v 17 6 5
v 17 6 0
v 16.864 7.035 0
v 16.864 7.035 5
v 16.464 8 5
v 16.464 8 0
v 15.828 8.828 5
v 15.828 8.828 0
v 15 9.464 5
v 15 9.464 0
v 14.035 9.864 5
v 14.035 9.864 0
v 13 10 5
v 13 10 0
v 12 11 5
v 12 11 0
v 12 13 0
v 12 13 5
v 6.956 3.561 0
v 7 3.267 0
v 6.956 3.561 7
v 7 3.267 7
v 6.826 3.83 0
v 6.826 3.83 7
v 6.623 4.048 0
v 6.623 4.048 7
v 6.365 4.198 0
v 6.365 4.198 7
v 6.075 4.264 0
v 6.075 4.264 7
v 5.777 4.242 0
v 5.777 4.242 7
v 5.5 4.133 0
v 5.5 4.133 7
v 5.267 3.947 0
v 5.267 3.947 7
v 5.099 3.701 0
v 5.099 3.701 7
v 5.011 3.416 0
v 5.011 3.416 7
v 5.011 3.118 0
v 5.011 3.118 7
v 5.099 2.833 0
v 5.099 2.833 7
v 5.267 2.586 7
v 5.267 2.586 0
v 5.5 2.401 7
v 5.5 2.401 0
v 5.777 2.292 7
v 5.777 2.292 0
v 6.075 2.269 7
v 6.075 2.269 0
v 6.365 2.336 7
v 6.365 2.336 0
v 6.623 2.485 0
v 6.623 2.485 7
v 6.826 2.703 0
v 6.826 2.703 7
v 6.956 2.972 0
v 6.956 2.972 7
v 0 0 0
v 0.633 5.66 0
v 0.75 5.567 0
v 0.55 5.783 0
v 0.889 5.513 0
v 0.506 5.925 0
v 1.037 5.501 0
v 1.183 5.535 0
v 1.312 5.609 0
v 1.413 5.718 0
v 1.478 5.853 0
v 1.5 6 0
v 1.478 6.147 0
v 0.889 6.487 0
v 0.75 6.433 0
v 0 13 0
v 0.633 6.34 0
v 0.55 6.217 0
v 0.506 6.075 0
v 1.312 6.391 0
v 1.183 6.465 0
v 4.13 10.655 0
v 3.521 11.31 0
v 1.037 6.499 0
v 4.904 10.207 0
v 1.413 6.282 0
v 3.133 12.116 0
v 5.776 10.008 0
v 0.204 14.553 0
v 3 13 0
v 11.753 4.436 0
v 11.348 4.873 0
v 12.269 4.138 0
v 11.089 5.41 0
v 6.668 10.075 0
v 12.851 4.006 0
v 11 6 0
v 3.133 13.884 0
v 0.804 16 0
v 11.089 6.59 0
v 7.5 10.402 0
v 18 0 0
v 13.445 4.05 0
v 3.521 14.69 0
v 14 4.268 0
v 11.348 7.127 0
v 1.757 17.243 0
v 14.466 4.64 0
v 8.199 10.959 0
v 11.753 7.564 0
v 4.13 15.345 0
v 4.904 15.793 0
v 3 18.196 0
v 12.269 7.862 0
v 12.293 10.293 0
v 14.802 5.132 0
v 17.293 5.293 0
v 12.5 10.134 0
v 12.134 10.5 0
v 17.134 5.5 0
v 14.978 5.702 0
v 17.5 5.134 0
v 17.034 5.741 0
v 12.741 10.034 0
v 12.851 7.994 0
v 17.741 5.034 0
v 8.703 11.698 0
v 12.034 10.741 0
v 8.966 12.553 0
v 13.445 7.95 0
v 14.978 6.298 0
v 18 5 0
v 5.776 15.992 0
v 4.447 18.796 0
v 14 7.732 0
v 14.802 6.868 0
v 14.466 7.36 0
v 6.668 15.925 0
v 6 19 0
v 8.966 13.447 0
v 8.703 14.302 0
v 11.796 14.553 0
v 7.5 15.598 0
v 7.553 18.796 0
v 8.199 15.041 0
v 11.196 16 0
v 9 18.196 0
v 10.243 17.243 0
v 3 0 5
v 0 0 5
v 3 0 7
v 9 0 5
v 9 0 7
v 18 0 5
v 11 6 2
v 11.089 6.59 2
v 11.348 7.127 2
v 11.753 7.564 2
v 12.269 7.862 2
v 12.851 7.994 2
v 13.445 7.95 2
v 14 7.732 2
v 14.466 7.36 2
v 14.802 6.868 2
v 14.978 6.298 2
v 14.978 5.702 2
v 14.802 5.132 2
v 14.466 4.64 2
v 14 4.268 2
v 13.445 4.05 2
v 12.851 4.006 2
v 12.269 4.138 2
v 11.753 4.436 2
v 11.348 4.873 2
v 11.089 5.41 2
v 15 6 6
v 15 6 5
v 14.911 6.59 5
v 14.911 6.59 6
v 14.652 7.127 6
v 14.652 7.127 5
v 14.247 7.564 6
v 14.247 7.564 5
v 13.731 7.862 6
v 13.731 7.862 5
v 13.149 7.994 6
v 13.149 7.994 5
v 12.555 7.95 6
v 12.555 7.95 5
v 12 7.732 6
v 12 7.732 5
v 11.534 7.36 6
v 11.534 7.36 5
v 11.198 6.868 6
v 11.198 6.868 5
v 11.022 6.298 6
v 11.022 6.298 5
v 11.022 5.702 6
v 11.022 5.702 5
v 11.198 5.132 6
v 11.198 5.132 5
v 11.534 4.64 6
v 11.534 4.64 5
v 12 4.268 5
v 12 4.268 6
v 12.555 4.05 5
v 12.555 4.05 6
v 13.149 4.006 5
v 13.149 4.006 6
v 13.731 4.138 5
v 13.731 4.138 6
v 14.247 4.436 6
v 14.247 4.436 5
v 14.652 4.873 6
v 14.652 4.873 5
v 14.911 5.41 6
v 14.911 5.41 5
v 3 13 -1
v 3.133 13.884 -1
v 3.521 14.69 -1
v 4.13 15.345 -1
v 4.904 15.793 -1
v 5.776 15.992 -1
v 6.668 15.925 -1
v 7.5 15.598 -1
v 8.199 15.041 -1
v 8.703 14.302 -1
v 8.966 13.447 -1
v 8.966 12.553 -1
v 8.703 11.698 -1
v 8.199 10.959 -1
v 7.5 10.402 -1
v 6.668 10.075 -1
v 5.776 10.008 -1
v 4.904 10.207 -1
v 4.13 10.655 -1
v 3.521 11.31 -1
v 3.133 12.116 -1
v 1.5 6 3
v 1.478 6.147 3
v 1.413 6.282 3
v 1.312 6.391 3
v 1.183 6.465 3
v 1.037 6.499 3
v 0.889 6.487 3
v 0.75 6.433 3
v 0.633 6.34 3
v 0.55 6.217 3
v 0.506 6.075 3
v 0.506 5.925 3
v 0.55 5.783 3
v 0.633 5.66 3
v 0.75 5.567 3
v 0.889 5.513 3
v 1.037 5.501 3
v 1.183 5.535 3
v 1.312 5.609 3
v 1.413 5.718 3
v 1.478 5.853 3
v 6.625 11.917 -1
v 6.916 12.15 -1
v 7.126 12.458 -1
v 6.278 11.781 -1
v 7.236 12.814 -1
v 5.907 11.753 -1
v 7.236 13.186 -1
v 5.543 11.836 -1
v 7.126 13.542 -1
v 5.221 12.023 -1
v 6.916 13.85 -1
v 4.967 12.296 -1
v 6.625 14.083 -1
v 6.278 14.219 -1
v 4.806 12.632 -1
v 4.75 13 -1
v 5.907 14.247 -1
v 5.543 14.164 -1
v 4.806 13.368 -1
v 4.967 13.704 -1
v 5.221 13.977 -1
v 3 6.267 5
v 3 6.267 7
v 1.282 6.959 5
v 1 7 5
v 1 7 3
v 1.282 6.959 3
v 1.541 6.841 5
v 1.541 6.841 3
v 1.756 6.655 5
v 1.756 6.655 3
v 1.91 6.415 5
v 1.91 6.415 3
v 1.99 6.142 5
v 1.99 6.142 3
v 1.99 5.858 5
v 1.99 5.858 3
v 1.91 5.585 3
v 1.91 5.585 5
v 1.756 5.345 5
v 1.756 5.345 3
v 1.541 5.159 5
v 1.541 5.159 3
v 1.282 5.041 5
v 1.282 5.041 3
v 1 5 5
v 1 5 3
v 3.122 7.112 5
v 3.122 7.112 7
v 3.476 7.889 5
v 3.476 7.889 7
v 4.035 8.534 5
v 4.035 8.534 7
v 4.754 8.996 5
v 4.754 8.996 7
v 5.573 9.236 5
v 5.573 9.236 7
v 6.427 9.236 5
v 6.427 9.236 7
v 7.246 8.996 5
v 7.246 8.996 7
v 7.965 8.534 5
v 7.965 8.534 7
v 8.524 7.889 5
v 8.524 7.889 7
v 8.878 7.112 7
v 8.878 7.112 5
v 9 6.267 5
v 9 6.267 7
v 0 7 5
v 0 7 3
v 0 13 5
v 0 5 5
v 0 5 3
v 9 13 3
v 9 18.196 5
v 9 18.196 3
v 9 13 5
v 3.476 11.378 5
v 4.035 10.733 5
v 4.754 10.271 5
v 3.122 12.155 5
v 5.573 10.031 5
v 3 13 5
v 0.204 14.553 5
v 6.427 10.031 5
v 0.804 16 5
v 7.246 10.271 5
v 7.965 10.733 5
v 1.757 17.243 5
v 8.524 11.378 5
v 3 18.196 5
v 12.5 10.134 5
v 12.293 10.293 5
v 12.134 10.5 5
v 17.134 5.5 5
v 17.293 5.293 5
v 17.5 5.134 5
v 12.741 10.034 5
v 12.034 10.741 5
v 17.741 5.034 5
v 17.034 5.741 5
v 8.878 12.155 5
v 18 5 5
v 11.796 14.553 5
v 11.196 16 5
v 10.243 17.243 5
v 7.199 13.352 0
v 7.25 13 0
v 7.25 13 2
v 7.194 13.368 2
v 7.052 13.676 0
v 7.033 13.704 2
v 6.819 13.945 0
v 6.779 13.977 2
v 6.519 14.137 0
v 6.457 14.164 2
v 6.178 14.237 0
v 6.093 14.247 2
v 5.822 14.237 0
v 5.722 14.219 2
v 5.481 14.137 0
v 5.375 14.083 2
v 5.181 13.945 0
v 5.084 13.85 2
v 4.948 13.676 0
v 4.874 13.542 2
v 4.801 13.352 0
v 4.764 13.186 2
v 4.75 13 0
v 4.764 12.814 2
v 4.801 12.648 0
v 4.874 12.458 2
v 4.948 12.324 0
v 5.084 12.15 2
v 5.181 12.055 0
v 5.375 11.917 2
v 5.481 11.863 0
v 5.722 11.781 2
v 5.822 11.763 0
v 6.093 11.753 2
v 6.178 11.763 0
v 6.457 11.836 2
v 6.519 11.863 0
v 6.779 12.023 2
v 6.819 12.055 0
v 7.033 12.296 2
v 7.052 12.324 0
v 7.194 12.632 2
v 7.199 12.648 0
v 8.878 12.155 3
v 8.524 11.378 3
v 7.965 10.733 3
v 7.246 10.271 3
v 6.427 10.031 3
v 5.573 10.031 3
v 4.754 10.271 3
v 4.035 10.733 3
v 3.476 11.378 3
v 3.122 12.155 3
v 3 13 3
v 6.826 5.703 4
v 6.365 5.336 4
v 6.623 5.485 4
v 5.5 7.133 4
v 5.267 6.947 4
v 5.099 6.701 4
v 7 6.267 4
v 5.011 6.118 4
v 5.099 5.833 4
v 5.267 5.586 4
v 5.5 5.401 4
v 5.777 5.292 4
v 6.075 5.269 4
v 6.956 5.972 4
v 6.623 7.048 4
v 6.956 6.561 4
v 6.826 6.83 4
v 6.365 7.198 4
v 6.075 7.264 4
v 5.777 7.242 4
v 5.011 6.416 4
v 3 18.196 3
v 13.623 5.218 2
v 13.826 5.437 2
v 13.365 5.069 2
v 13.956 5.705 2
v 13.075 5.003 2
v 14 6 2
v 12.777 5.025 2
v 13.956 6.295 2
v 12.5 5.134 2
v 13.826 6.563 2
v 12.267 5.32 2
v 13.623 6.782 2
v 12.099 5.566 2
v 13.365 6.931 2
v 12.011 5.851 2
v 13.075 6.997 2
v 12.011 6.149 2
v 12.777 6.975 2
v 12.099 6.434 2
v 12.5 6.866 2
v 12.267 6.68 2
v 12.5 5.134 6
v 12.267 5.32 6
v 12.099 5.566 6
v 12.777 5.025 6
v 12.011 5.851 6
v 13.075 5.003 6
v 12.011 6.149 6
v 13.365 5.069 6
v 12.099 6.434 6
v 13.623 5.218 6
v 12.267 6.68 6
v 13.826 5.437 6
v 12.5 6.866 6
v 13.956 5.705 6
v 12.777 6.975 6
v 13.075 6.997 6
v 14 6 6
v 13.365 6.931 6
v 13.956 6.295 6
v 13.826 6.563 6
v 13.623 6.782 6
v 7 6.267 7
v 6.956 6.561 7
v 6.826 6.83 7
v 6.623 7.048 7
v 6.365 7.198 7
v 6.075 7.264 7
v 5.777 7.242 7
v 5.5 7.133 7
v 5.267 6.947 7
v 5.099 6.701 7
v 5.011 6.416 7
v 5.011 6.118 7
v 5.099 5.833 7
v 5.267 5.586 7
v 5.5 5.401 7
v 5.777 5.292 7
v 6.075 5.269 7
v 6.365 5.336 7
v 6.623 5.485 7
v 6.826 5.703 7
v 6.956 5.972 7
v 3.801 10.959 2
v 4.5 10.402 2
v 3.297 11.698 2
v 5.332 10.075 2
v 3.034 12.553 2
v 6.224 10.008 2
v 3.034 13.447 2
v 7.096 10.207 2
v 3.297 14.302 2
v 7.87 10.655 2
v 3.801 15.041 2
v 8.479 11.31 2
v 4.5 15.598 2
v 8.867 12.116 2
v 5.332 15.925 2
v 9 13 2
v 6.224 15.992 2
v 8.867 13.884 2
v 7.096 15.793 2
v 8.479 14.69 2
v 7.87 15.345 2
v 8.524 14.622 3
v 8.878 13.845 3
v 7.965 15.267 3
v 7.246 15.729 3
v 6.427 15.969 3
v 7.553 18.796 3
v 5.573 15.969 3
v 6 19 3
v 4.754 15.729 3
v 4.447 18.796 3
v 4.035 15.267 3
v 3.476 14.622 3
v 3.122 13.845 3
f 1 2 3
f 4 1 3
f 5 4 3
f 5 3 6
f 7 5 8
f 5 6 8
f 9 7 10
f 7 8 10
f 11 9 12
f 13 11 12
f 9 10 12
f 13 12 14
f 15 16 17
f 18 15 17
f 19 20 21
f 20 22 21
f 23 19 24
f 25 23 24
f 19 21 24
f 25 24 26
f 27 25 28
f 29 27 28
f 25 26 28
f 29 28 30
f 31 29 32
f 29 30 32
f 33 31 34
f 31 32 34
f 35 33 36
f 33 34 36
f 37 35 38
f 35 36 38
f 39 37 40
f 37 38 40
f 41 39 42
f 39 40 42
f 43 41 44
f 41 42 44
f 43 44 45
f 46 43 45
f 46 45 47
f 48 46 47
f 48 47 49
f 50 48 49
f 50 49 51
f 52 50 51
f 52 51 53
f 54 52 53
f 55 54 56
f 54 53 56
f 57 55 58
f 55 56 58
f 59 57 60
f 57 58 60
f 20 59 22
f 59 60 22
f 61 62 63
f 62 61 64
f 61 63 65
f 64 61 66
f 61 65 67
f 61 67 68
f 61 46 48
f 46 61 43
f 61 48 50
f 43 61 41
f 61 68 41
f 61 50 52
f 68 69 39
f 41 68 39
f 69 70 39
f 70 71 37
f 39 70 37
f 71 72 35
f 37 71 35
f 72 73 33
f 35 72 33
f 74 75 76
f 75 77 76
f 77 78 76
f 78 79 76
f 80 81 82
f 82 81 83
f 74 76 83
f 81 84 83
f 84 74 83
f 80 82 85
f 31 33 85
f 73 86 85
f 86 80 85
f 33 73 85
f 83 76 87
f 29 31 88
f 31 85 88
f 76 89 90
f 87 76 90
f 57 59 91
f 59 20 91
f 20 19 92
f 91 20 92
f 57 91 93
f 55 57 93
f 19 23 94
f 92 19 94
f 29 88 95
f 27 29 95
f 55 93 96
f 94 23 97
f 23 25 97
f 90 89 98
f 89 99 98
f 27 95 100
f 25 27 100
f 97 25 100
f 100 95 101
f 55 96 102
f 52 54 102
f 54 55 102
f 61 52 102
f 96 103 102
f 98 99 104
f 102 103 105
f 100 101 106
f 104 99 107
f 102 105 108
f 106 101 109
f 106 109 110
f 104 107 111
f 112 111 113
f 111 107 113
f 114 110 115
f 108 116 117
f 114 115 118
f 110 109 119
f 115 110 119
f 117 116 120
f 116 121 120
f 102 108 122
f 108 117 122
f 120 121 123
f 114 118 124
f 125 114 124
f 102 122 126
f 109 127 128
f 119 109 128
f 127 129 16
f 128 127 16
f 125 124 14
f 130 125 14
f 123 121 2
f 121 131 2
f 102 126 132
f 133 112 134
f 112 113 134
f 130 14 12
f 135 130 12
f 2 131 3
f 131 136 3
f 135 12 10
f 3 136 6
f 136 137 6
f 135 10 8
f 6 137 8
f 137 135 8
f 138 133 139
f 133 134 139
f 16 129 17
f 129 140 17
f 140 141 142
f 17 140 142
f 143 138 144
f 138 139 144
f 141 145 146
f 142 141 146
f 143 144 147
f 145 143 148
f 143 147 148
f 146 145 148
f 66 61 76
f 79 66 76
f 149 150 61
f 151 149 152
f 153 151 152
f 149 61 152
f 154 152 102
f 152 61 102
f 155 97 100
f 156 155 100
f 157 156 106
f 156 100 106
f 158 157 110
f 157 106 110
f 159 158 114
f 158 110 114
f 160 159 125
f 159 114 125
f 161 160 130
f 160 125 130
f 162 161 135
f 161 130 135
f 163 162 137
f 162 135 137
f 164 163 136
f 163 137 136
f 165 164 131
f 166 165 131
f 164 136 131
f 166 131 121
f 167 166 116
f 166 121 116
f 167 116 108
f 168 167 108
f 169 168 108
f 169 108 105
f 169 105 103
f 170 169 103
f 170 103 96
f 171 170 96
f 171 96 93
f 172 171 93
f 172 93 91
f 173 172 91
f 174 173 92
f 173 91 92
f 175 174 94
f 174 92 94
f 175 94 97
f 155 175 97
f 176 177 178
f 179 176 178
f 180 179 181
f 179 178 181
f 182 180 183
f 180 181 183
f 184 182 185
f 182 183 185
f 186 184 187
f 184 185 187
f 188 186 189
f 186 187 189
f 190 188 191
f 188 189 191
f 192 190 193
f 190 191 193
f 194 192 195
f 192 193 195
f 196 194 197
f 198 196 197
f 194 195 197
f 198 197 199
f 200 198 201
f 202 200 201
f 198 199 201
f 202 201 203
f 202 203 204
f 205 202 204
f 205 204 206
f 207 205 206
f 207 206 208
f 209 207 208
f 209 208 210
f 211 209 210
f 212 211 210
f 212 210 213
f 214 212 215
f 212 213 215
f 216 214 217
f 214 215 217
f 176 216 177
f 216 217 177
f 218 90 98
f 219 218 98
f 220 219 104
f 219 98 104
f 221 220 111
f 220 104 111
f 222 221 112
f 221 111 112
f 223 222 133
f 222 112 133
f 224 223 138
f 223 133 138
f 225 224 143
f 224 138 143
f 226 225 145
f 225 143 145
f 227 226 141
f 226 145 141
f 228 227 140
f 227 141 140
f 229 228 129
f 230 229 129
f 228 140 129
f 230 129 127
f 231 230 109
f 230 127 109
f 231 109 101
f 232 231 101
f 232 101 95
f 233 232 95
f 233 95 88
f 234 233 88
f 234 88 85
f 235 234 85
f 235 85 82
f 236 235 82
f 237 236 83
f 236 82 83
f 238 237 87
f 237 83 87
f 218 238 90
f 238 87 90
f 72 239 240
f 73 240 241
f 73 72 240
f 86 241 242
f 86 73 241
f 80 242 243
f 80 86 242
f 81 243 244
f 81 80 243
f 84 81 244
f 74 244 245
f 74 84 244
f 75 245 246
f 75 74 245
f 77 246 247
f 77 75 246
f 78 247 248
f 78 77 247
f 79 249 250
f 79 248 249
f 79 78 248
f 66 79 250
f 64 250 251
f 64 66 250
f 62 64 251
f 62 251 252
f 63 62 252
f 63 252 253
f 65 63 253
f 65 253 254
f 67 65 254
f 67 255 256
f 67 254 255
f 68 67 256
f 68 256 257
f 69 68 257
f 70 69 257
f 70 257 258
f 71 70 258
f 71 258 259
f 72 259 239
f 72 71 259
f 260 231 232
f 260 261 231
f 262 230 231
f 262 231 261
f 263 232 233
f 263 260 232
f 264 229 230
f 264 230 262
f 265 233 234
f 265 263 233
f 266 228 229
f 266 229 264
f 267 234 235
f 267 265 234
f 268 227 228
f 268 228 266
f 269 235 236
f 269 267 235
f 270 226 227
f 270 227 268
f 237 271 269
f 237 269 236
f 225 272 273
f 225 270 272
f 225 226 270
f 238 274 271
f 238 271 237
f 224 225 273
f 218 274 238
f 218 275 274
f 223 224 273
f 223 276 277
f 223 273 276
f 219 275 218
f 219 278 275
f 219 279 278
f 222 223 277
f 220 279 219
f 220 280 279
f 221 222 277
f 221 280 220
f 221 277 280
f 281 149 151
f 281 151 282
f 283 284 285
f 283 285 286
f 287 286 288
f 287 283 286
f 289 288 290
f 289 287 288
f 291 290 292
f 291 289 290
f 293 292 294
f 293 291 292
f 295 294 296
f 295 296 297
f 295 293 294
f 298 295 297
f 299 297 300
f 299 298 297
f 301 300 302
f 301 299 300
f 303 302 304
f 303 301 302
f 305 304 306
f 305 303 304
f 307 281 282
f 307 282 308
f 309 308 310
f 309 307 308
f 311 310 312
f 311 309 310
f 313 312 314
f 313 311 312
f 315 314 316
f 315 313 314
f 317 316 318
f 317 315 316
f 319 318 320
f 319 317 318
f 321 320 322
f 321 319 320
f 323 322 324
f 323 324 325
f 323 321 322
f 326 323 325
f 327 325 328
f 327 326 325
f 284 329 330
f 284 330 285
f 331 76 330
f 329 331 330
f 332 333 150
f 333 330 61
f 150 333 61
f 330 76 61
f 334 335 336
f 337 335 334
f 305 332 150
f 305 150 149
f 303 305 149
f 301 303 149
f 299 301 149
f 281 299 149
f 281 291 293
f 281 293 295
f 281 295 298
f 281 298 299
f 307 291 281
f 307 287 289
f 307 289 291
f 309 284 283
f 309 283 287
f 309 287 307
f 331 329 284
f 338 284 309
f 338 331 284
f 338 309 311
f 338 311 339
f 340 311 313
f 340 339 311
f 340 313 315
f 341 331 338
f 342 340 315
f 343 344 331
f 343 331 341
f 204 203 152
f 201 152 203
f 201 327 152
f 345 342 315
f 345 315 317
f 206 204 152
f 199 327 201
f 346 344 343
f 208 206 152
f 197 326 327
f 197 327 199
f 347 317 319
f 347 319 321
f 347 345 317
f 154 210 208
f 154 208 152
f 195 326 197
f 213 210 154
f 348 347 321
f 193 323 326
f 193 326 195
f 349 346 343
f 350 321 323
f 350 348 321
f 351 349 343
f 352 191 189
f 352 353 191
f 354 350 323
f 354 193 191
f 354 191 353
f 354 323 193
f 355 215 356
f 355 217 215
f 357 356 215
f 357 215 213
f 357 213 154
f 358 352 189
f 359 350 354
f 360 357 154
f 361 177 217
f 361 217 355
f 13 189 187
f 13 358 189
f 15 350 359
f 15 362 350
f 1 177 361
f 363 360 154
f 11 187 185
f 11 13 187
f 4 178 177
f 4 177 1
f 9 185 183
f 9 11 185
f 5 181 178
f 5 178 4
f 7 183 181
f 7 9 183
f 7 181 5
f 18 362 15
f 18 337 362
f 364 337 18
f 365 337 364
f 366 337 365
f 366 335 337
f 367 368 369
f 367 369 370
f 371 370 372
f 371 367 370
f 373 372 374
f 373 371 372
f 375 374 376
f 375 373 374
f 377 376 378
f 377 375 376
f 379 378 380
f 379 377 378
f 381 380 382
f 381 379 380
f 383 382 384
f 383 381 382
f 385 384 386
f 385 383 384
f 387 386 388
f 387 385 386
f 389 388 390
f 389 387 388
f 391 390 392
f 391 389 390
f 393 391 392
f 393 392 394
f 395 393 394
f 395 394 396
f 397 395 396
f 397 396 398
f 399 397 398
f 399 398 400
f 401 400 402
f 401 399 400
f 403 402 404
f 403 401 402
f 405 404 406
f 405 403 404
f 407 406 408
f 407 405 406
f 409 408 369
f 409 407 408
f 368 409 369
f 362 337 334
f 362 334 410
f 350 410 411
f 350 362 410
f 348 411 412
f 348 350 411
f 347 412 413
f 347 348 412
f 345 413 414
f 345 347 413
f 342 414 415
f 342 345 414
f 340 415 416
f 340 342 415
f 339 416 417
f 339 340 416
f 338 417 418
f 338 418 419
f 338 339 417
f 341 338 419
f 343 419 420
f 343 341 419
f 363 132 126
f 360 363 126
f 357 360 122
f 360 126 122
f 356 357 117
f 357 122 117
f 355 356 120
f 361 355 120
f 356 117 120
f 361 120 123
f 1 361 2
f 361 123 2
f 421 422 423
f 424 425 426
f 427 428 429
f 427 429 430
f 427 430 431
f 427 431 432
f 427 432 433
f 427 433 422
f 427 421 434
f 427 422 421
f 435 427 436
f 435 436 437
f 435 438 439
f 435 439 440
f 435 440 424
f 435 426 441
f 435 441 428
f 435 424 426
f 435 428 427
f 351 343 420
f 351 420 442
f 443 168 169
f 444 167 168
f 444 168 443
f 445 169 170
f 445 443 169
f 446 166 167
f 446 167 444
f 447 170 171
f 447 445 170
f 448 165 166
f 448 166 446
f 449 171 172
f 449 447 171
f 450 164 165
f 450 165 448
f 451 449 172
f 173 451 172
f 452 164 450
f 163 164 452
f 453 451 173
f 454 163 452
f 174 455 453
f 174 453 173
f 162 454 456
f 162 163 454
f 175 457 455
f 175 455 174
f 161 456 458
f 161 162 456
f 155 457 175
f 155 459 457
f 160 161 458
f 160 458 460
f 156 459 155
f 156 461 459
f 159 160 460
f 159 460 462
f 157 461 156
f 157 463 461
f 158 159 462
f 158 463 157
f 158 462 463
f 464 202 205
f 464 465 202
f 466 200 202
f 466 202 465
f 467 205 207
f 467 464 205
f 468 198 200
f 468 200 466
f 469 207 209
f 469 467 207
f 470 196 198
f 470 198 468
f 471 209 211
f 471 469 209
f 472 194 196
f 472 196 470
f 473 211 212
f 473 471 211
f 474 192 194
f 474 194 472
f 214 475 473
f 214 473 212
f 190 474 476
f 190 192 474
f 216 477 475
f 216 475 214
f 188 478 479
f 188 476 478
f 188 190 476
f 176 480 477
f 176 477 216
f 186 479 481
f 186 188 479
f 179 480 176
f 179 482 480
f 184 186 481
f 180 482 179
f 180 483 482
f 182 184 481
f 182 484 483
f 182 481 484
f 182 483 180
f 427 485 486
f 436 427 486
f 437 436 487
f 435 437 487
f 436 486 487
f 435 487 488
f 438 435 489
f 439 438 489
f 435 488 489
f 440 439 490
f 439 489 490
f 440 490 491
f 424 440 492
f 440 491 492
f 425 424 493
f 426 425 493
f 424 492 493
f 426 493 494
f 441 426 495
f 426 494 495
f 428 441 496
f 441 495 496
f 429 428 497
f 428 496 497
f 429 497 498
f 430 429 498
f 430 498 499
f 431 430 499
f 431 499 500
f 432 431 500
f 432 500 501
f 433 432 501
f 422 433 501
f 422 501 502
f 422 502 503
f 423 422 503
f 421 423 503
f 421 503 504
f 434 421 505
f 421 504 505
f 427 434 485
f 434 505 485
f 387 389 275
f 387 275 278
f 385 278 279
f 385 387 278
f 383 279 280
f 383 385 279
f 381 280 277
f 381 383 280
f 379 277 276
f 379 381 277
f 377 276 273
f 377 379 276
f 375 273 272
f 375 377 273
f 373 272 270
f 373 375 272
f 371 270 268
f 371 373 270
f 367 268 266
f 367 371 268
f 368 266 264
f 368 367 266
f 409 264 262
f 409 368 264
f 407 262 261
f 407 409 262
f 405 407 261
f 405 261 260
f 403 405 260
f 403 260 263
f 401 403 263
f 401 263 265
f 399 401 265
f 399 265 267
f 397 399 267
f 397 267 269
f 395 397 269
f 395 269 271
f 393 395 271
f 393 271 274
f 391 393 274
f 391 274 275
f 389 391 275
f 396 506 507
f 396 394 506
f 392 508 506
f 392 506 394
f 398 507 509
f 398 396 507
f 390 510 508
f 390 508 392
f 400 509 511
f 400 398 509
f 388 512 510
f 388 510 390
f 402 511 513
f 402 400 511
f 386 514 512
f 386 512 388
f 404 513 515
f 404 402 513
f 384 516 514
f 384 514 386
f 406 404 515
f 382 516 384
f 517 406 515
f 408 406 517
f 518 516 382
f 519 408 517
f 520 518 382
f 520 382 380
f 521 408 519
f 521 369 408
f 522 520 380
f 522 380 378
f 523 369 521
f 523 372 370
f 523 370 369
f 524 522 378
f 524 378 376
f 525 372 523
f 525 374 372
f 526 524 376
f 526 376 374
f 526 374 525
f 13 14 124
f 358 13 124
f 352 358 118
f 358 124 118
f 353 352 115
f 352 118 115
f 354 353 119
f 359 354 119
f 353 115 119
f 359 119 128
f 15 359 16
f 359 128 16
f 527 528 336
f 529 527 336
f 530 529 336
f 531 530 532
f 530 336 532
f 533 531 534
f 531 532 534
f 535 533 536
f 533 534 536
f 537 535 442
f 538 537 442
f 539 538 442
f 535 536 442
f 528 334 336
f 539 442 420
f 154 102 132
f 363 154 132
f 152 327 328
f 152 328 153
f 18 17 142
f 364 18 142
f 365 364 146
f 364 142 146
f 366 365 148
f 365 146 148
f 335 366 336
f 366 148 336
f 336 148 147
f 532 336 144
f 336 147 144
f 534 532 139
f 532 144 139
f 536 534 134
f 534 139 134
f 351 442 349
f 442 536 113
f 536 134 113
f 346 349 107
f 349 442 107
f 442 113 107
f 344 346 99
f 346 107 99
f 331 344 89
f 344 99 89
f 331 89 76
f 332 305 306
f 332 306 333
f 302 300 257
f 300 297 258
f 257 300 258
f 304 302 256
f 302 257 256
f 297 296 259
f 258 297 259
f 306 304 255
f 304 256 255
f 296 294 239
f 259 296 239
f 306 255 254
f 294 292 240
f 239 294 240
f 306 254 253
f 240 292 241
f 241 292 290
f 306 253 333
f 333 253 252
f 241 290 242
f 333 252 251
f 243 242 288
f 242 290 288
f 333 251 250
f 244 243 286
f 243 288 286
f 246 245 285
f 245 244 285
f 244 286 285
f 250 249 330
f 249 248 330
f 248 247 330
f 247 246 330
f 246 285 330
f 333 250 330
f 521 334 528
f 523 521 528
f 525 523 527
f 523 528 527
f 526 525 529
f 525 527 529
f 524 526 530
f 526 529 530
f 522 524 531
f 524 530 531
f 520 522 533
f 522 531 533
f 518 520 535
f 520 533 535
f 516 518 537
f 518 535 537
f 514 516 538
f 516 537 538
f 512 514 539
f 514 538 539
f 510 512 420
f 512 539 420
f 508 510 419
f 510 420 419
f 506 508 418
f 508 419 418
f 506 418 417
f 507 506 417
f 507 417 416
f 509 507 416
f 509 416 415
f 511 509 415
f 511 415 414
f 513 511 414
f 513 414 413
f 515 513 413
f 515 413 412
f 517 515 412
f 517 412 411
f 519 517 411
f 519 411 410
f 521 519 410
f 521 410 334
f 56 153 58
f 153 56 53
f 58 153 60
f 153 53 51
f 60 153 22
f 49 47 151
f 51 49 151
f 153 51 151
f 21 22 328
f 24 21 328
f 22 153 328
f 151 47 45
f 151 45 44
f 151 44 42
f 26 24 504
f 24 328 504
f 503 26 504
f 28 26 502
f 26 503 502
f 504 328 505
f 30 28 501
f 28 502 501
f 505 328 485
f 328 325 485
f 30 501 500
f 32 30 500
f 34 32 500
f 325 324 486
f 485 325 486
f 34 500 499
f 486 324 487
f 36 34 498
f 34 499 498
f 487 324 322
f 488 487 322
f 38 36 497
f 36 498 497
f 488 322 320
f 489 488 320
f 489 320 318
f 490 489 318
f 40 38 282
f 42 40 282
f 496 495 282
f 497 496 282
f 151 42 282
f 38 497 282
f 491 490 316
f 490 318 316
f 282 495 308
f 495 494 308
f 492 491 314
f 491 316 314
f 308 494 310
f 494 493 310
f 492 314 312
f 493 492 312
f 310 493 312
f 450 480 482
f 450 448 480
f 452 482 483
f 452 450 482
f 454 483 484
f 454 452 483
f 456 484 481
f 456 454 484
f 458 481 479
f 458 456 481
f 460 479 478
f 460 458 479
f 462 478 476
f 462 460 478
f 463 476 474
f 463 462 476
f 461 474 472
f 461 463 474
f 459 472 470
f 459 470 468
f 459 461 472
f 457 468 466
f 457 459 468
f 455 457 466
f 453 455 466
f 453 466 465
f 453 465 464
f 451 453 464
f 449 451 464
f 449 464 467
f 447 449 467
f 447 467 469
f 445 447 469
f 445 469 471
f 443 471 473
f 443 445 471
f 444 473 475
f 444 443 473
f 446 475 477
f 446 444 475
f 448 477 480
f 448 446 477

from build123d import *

# Parameters (mm, degrees)
SKETCH1_R           = 1.25
SKETCH1_R_2         = 0.5
SKETCH1_R_3         = 1
BOSS_EXTRUDE1_DEPTH = 5
SKETCH2_R           = 2
CUT_EXTRUDE1_DEPTH  = 2
CUT_EXTRUDE2_DEPTH  = 2
BOSS_EXTRUDE2_DEPTH = 2
SKETCH5_R           = 2
SKETCH5_R_2         = 1
BOSS_EXTRUDE3_DEPTH = 1
SKETCH6_R           = 1.25
BOSS_EXTRUDE4_DEPTH = 1
SKETCH7_R           = 1
CUT_EXTRUDE3_DEPTH  = 3
CUT_EXTRUDE4_DEPTH  = 2
SKETCH9_R           = 3
CUT_EXTRUDE5_DEPTH  = 1
SKETCH10_R          = 1
CUT_EXTRUDE6_DEPTH  = 4


with BuildPart() as part:
    # Sketch1 → Boss-Extrude1 (new body)
    with BuildSketch(Plane.XY):
        with BuildLine():
            Line((0, 0), (18, 0))
            Line((18, 0), (18, 5))
            ThreePointArc((18, 5), (17.292893219, 5.292893219), (17, 6))
            ThreePointArc((17, 6), (15.828427125, 8.828427125), (13, 10))
            ThreePointArc((13, 10), (12.292893219, 10.292893219), (12, 11))
            Line((12, 11), (12, 13))
            ThreePointArc((12, 13), (6, 19), (0, 13))
            Line((0, 13), (0, 0))
        make_face()
        with Locations((6, 13)):
            Circle(SKETCH1_R, mode=Mode.SUBTRACT)
        with Locations((1, 6)):
            Circle(SKETCH1_R_2, mode=Mode.SUBTRACT)
        with Locations((13, 6)):
            Circle(SKETCH1_R_3, mode=Mode.SUBTRACT)
    extrude(amount=BOSS_EXTRUDE1_DEPTH)

    # Sketch2 → Cut-Extrude1 (cut)
    with BuildSketch(Plane(origin=(0, 0, 0), x_dir=(-1, 0, 0), z_dir=(0, 0, -1))):
        with Locations((-13, 6)):
            Circle(SKETCH2_R)
    extrude(amount=-CUT_EXTRUDE1_DEPTH, mode=Mode.SUBTRACT)

    # Sketch3 → Cut-Extrude2 (cut)
    with BuildSketch(Plane.XY.offset(5)):
        with BuildLine():
            Line((3, 13), (3, 19.864652962))
            ThreePointArc((3, 19.864652962), (6, 22.864652962), (9, 19.864652962))
            Line((9, 19.864652962), (9, 13))
            ThreePointArc((9, 13), (6, 10), (3, 13))
        make_face()
    extrude(amount=-CUT_EXTRUDE2_DEPTH, mode=Mode.SUBTRACT)

    # Sketch4 → Boss-Extrude2 (add)
    with BuildSketch(Plane.XY.offset(5)):
        with BuildLine():
            Line((9, 6.266637239), (9, 0))
            Line((9, 0), (3, 0))
            Line((3, 0), (3, 6.266637239))
            ThreePointArc((3, 6.266637239), (6, 9.266637239), (9, 6.266637239))
        make_face()
    extrude(amount=BOSS_EXTRUDE2_DEPTH)

    # Sketch5 → Boss-Extrude3 (add)
    with BuildSketch(Plane.XY.offset(5)):
        with Locations((13, 6)):
            Circle(SKETCH5_R)
        with Locations((13, 6)):
            Circle(SKETCH5_R_2, mode=Mode.SUBTRACT)
    extrude(amount=BOSS_EXTRUDE3_DEPTH)

    # Sketch6 → Boss-Extrude4 (add)
    with BuildSketch(Plane(origin=(0, 0, 0), x_dir=(-1, 0, 0), z_dir=(0, 0, -1))):
        with BuildLine():
            ThreePointArc((-9, 13), (-6, 10), (-3, 13))
            ThreePointArc((-3, 13), (-6, 16), (-9, 13))
        make_face()
        with Locations((-6, 13)):
            Circle(SKETCH6_R, mode=Mode.SUBTRACT)
    extrude(amount=BOSS_EXTRUDE4_DEPTH)

    # Sketch7 → Cut-Extrude3 (cut)
    with BuildSketch(Plane.XY.offset(7)):
        with Locations((6, 6.266637239)):
            Circle(SKETCH7_R)
        with Locations((6, 3.266637239)):
            Circle(SKETCH7_R)
    extrude(amount=-CUT_EXTRUDE3_DEPTH, mode=Mode.SUBTRACT)

    # Sketch8 → Cut-Extrude4 (cut)
    with BuildSketch(Plane.XY.offset(5)):
        with BuildLine():
            Line((1, 5), (-1.045150713, 5))
            ThreePointArc((-1.045150713, 5), (-2.045150713, 6), (-1.045150713, 7))
            Line((-1.045150713, 7), (1, 7))
            ThreePointArc((1, 7), (2, 6), (1, 5))
        make_face()
    extrude(amount=-CUT_EXTRUDE4_DEPTH, mode=Mode.SUBTRACT)

    # Sketch9 → Cut-Extrude5 (cut)
    with BuildSketch(Plane.XY.offset(3)):
        with Locations((6, 13)):
            Circle(SKETCH9_R)
    extrude(amount=-CUT_EXTRUDE5_DEPTH, mode=Mode.SUBTRACT)

    # Sketch10 → Cut-Extrude6 (cut)
    with BuildSketch(Plane.XY.offset(4)):
        with Locations((6, 3.266637239)):
            Circle(SKETCH10_R)
    extrude(amount=-CUT_EXTRUDE6_DEPTH, mode=Mode.SUBTRACT)


solid = part.part
